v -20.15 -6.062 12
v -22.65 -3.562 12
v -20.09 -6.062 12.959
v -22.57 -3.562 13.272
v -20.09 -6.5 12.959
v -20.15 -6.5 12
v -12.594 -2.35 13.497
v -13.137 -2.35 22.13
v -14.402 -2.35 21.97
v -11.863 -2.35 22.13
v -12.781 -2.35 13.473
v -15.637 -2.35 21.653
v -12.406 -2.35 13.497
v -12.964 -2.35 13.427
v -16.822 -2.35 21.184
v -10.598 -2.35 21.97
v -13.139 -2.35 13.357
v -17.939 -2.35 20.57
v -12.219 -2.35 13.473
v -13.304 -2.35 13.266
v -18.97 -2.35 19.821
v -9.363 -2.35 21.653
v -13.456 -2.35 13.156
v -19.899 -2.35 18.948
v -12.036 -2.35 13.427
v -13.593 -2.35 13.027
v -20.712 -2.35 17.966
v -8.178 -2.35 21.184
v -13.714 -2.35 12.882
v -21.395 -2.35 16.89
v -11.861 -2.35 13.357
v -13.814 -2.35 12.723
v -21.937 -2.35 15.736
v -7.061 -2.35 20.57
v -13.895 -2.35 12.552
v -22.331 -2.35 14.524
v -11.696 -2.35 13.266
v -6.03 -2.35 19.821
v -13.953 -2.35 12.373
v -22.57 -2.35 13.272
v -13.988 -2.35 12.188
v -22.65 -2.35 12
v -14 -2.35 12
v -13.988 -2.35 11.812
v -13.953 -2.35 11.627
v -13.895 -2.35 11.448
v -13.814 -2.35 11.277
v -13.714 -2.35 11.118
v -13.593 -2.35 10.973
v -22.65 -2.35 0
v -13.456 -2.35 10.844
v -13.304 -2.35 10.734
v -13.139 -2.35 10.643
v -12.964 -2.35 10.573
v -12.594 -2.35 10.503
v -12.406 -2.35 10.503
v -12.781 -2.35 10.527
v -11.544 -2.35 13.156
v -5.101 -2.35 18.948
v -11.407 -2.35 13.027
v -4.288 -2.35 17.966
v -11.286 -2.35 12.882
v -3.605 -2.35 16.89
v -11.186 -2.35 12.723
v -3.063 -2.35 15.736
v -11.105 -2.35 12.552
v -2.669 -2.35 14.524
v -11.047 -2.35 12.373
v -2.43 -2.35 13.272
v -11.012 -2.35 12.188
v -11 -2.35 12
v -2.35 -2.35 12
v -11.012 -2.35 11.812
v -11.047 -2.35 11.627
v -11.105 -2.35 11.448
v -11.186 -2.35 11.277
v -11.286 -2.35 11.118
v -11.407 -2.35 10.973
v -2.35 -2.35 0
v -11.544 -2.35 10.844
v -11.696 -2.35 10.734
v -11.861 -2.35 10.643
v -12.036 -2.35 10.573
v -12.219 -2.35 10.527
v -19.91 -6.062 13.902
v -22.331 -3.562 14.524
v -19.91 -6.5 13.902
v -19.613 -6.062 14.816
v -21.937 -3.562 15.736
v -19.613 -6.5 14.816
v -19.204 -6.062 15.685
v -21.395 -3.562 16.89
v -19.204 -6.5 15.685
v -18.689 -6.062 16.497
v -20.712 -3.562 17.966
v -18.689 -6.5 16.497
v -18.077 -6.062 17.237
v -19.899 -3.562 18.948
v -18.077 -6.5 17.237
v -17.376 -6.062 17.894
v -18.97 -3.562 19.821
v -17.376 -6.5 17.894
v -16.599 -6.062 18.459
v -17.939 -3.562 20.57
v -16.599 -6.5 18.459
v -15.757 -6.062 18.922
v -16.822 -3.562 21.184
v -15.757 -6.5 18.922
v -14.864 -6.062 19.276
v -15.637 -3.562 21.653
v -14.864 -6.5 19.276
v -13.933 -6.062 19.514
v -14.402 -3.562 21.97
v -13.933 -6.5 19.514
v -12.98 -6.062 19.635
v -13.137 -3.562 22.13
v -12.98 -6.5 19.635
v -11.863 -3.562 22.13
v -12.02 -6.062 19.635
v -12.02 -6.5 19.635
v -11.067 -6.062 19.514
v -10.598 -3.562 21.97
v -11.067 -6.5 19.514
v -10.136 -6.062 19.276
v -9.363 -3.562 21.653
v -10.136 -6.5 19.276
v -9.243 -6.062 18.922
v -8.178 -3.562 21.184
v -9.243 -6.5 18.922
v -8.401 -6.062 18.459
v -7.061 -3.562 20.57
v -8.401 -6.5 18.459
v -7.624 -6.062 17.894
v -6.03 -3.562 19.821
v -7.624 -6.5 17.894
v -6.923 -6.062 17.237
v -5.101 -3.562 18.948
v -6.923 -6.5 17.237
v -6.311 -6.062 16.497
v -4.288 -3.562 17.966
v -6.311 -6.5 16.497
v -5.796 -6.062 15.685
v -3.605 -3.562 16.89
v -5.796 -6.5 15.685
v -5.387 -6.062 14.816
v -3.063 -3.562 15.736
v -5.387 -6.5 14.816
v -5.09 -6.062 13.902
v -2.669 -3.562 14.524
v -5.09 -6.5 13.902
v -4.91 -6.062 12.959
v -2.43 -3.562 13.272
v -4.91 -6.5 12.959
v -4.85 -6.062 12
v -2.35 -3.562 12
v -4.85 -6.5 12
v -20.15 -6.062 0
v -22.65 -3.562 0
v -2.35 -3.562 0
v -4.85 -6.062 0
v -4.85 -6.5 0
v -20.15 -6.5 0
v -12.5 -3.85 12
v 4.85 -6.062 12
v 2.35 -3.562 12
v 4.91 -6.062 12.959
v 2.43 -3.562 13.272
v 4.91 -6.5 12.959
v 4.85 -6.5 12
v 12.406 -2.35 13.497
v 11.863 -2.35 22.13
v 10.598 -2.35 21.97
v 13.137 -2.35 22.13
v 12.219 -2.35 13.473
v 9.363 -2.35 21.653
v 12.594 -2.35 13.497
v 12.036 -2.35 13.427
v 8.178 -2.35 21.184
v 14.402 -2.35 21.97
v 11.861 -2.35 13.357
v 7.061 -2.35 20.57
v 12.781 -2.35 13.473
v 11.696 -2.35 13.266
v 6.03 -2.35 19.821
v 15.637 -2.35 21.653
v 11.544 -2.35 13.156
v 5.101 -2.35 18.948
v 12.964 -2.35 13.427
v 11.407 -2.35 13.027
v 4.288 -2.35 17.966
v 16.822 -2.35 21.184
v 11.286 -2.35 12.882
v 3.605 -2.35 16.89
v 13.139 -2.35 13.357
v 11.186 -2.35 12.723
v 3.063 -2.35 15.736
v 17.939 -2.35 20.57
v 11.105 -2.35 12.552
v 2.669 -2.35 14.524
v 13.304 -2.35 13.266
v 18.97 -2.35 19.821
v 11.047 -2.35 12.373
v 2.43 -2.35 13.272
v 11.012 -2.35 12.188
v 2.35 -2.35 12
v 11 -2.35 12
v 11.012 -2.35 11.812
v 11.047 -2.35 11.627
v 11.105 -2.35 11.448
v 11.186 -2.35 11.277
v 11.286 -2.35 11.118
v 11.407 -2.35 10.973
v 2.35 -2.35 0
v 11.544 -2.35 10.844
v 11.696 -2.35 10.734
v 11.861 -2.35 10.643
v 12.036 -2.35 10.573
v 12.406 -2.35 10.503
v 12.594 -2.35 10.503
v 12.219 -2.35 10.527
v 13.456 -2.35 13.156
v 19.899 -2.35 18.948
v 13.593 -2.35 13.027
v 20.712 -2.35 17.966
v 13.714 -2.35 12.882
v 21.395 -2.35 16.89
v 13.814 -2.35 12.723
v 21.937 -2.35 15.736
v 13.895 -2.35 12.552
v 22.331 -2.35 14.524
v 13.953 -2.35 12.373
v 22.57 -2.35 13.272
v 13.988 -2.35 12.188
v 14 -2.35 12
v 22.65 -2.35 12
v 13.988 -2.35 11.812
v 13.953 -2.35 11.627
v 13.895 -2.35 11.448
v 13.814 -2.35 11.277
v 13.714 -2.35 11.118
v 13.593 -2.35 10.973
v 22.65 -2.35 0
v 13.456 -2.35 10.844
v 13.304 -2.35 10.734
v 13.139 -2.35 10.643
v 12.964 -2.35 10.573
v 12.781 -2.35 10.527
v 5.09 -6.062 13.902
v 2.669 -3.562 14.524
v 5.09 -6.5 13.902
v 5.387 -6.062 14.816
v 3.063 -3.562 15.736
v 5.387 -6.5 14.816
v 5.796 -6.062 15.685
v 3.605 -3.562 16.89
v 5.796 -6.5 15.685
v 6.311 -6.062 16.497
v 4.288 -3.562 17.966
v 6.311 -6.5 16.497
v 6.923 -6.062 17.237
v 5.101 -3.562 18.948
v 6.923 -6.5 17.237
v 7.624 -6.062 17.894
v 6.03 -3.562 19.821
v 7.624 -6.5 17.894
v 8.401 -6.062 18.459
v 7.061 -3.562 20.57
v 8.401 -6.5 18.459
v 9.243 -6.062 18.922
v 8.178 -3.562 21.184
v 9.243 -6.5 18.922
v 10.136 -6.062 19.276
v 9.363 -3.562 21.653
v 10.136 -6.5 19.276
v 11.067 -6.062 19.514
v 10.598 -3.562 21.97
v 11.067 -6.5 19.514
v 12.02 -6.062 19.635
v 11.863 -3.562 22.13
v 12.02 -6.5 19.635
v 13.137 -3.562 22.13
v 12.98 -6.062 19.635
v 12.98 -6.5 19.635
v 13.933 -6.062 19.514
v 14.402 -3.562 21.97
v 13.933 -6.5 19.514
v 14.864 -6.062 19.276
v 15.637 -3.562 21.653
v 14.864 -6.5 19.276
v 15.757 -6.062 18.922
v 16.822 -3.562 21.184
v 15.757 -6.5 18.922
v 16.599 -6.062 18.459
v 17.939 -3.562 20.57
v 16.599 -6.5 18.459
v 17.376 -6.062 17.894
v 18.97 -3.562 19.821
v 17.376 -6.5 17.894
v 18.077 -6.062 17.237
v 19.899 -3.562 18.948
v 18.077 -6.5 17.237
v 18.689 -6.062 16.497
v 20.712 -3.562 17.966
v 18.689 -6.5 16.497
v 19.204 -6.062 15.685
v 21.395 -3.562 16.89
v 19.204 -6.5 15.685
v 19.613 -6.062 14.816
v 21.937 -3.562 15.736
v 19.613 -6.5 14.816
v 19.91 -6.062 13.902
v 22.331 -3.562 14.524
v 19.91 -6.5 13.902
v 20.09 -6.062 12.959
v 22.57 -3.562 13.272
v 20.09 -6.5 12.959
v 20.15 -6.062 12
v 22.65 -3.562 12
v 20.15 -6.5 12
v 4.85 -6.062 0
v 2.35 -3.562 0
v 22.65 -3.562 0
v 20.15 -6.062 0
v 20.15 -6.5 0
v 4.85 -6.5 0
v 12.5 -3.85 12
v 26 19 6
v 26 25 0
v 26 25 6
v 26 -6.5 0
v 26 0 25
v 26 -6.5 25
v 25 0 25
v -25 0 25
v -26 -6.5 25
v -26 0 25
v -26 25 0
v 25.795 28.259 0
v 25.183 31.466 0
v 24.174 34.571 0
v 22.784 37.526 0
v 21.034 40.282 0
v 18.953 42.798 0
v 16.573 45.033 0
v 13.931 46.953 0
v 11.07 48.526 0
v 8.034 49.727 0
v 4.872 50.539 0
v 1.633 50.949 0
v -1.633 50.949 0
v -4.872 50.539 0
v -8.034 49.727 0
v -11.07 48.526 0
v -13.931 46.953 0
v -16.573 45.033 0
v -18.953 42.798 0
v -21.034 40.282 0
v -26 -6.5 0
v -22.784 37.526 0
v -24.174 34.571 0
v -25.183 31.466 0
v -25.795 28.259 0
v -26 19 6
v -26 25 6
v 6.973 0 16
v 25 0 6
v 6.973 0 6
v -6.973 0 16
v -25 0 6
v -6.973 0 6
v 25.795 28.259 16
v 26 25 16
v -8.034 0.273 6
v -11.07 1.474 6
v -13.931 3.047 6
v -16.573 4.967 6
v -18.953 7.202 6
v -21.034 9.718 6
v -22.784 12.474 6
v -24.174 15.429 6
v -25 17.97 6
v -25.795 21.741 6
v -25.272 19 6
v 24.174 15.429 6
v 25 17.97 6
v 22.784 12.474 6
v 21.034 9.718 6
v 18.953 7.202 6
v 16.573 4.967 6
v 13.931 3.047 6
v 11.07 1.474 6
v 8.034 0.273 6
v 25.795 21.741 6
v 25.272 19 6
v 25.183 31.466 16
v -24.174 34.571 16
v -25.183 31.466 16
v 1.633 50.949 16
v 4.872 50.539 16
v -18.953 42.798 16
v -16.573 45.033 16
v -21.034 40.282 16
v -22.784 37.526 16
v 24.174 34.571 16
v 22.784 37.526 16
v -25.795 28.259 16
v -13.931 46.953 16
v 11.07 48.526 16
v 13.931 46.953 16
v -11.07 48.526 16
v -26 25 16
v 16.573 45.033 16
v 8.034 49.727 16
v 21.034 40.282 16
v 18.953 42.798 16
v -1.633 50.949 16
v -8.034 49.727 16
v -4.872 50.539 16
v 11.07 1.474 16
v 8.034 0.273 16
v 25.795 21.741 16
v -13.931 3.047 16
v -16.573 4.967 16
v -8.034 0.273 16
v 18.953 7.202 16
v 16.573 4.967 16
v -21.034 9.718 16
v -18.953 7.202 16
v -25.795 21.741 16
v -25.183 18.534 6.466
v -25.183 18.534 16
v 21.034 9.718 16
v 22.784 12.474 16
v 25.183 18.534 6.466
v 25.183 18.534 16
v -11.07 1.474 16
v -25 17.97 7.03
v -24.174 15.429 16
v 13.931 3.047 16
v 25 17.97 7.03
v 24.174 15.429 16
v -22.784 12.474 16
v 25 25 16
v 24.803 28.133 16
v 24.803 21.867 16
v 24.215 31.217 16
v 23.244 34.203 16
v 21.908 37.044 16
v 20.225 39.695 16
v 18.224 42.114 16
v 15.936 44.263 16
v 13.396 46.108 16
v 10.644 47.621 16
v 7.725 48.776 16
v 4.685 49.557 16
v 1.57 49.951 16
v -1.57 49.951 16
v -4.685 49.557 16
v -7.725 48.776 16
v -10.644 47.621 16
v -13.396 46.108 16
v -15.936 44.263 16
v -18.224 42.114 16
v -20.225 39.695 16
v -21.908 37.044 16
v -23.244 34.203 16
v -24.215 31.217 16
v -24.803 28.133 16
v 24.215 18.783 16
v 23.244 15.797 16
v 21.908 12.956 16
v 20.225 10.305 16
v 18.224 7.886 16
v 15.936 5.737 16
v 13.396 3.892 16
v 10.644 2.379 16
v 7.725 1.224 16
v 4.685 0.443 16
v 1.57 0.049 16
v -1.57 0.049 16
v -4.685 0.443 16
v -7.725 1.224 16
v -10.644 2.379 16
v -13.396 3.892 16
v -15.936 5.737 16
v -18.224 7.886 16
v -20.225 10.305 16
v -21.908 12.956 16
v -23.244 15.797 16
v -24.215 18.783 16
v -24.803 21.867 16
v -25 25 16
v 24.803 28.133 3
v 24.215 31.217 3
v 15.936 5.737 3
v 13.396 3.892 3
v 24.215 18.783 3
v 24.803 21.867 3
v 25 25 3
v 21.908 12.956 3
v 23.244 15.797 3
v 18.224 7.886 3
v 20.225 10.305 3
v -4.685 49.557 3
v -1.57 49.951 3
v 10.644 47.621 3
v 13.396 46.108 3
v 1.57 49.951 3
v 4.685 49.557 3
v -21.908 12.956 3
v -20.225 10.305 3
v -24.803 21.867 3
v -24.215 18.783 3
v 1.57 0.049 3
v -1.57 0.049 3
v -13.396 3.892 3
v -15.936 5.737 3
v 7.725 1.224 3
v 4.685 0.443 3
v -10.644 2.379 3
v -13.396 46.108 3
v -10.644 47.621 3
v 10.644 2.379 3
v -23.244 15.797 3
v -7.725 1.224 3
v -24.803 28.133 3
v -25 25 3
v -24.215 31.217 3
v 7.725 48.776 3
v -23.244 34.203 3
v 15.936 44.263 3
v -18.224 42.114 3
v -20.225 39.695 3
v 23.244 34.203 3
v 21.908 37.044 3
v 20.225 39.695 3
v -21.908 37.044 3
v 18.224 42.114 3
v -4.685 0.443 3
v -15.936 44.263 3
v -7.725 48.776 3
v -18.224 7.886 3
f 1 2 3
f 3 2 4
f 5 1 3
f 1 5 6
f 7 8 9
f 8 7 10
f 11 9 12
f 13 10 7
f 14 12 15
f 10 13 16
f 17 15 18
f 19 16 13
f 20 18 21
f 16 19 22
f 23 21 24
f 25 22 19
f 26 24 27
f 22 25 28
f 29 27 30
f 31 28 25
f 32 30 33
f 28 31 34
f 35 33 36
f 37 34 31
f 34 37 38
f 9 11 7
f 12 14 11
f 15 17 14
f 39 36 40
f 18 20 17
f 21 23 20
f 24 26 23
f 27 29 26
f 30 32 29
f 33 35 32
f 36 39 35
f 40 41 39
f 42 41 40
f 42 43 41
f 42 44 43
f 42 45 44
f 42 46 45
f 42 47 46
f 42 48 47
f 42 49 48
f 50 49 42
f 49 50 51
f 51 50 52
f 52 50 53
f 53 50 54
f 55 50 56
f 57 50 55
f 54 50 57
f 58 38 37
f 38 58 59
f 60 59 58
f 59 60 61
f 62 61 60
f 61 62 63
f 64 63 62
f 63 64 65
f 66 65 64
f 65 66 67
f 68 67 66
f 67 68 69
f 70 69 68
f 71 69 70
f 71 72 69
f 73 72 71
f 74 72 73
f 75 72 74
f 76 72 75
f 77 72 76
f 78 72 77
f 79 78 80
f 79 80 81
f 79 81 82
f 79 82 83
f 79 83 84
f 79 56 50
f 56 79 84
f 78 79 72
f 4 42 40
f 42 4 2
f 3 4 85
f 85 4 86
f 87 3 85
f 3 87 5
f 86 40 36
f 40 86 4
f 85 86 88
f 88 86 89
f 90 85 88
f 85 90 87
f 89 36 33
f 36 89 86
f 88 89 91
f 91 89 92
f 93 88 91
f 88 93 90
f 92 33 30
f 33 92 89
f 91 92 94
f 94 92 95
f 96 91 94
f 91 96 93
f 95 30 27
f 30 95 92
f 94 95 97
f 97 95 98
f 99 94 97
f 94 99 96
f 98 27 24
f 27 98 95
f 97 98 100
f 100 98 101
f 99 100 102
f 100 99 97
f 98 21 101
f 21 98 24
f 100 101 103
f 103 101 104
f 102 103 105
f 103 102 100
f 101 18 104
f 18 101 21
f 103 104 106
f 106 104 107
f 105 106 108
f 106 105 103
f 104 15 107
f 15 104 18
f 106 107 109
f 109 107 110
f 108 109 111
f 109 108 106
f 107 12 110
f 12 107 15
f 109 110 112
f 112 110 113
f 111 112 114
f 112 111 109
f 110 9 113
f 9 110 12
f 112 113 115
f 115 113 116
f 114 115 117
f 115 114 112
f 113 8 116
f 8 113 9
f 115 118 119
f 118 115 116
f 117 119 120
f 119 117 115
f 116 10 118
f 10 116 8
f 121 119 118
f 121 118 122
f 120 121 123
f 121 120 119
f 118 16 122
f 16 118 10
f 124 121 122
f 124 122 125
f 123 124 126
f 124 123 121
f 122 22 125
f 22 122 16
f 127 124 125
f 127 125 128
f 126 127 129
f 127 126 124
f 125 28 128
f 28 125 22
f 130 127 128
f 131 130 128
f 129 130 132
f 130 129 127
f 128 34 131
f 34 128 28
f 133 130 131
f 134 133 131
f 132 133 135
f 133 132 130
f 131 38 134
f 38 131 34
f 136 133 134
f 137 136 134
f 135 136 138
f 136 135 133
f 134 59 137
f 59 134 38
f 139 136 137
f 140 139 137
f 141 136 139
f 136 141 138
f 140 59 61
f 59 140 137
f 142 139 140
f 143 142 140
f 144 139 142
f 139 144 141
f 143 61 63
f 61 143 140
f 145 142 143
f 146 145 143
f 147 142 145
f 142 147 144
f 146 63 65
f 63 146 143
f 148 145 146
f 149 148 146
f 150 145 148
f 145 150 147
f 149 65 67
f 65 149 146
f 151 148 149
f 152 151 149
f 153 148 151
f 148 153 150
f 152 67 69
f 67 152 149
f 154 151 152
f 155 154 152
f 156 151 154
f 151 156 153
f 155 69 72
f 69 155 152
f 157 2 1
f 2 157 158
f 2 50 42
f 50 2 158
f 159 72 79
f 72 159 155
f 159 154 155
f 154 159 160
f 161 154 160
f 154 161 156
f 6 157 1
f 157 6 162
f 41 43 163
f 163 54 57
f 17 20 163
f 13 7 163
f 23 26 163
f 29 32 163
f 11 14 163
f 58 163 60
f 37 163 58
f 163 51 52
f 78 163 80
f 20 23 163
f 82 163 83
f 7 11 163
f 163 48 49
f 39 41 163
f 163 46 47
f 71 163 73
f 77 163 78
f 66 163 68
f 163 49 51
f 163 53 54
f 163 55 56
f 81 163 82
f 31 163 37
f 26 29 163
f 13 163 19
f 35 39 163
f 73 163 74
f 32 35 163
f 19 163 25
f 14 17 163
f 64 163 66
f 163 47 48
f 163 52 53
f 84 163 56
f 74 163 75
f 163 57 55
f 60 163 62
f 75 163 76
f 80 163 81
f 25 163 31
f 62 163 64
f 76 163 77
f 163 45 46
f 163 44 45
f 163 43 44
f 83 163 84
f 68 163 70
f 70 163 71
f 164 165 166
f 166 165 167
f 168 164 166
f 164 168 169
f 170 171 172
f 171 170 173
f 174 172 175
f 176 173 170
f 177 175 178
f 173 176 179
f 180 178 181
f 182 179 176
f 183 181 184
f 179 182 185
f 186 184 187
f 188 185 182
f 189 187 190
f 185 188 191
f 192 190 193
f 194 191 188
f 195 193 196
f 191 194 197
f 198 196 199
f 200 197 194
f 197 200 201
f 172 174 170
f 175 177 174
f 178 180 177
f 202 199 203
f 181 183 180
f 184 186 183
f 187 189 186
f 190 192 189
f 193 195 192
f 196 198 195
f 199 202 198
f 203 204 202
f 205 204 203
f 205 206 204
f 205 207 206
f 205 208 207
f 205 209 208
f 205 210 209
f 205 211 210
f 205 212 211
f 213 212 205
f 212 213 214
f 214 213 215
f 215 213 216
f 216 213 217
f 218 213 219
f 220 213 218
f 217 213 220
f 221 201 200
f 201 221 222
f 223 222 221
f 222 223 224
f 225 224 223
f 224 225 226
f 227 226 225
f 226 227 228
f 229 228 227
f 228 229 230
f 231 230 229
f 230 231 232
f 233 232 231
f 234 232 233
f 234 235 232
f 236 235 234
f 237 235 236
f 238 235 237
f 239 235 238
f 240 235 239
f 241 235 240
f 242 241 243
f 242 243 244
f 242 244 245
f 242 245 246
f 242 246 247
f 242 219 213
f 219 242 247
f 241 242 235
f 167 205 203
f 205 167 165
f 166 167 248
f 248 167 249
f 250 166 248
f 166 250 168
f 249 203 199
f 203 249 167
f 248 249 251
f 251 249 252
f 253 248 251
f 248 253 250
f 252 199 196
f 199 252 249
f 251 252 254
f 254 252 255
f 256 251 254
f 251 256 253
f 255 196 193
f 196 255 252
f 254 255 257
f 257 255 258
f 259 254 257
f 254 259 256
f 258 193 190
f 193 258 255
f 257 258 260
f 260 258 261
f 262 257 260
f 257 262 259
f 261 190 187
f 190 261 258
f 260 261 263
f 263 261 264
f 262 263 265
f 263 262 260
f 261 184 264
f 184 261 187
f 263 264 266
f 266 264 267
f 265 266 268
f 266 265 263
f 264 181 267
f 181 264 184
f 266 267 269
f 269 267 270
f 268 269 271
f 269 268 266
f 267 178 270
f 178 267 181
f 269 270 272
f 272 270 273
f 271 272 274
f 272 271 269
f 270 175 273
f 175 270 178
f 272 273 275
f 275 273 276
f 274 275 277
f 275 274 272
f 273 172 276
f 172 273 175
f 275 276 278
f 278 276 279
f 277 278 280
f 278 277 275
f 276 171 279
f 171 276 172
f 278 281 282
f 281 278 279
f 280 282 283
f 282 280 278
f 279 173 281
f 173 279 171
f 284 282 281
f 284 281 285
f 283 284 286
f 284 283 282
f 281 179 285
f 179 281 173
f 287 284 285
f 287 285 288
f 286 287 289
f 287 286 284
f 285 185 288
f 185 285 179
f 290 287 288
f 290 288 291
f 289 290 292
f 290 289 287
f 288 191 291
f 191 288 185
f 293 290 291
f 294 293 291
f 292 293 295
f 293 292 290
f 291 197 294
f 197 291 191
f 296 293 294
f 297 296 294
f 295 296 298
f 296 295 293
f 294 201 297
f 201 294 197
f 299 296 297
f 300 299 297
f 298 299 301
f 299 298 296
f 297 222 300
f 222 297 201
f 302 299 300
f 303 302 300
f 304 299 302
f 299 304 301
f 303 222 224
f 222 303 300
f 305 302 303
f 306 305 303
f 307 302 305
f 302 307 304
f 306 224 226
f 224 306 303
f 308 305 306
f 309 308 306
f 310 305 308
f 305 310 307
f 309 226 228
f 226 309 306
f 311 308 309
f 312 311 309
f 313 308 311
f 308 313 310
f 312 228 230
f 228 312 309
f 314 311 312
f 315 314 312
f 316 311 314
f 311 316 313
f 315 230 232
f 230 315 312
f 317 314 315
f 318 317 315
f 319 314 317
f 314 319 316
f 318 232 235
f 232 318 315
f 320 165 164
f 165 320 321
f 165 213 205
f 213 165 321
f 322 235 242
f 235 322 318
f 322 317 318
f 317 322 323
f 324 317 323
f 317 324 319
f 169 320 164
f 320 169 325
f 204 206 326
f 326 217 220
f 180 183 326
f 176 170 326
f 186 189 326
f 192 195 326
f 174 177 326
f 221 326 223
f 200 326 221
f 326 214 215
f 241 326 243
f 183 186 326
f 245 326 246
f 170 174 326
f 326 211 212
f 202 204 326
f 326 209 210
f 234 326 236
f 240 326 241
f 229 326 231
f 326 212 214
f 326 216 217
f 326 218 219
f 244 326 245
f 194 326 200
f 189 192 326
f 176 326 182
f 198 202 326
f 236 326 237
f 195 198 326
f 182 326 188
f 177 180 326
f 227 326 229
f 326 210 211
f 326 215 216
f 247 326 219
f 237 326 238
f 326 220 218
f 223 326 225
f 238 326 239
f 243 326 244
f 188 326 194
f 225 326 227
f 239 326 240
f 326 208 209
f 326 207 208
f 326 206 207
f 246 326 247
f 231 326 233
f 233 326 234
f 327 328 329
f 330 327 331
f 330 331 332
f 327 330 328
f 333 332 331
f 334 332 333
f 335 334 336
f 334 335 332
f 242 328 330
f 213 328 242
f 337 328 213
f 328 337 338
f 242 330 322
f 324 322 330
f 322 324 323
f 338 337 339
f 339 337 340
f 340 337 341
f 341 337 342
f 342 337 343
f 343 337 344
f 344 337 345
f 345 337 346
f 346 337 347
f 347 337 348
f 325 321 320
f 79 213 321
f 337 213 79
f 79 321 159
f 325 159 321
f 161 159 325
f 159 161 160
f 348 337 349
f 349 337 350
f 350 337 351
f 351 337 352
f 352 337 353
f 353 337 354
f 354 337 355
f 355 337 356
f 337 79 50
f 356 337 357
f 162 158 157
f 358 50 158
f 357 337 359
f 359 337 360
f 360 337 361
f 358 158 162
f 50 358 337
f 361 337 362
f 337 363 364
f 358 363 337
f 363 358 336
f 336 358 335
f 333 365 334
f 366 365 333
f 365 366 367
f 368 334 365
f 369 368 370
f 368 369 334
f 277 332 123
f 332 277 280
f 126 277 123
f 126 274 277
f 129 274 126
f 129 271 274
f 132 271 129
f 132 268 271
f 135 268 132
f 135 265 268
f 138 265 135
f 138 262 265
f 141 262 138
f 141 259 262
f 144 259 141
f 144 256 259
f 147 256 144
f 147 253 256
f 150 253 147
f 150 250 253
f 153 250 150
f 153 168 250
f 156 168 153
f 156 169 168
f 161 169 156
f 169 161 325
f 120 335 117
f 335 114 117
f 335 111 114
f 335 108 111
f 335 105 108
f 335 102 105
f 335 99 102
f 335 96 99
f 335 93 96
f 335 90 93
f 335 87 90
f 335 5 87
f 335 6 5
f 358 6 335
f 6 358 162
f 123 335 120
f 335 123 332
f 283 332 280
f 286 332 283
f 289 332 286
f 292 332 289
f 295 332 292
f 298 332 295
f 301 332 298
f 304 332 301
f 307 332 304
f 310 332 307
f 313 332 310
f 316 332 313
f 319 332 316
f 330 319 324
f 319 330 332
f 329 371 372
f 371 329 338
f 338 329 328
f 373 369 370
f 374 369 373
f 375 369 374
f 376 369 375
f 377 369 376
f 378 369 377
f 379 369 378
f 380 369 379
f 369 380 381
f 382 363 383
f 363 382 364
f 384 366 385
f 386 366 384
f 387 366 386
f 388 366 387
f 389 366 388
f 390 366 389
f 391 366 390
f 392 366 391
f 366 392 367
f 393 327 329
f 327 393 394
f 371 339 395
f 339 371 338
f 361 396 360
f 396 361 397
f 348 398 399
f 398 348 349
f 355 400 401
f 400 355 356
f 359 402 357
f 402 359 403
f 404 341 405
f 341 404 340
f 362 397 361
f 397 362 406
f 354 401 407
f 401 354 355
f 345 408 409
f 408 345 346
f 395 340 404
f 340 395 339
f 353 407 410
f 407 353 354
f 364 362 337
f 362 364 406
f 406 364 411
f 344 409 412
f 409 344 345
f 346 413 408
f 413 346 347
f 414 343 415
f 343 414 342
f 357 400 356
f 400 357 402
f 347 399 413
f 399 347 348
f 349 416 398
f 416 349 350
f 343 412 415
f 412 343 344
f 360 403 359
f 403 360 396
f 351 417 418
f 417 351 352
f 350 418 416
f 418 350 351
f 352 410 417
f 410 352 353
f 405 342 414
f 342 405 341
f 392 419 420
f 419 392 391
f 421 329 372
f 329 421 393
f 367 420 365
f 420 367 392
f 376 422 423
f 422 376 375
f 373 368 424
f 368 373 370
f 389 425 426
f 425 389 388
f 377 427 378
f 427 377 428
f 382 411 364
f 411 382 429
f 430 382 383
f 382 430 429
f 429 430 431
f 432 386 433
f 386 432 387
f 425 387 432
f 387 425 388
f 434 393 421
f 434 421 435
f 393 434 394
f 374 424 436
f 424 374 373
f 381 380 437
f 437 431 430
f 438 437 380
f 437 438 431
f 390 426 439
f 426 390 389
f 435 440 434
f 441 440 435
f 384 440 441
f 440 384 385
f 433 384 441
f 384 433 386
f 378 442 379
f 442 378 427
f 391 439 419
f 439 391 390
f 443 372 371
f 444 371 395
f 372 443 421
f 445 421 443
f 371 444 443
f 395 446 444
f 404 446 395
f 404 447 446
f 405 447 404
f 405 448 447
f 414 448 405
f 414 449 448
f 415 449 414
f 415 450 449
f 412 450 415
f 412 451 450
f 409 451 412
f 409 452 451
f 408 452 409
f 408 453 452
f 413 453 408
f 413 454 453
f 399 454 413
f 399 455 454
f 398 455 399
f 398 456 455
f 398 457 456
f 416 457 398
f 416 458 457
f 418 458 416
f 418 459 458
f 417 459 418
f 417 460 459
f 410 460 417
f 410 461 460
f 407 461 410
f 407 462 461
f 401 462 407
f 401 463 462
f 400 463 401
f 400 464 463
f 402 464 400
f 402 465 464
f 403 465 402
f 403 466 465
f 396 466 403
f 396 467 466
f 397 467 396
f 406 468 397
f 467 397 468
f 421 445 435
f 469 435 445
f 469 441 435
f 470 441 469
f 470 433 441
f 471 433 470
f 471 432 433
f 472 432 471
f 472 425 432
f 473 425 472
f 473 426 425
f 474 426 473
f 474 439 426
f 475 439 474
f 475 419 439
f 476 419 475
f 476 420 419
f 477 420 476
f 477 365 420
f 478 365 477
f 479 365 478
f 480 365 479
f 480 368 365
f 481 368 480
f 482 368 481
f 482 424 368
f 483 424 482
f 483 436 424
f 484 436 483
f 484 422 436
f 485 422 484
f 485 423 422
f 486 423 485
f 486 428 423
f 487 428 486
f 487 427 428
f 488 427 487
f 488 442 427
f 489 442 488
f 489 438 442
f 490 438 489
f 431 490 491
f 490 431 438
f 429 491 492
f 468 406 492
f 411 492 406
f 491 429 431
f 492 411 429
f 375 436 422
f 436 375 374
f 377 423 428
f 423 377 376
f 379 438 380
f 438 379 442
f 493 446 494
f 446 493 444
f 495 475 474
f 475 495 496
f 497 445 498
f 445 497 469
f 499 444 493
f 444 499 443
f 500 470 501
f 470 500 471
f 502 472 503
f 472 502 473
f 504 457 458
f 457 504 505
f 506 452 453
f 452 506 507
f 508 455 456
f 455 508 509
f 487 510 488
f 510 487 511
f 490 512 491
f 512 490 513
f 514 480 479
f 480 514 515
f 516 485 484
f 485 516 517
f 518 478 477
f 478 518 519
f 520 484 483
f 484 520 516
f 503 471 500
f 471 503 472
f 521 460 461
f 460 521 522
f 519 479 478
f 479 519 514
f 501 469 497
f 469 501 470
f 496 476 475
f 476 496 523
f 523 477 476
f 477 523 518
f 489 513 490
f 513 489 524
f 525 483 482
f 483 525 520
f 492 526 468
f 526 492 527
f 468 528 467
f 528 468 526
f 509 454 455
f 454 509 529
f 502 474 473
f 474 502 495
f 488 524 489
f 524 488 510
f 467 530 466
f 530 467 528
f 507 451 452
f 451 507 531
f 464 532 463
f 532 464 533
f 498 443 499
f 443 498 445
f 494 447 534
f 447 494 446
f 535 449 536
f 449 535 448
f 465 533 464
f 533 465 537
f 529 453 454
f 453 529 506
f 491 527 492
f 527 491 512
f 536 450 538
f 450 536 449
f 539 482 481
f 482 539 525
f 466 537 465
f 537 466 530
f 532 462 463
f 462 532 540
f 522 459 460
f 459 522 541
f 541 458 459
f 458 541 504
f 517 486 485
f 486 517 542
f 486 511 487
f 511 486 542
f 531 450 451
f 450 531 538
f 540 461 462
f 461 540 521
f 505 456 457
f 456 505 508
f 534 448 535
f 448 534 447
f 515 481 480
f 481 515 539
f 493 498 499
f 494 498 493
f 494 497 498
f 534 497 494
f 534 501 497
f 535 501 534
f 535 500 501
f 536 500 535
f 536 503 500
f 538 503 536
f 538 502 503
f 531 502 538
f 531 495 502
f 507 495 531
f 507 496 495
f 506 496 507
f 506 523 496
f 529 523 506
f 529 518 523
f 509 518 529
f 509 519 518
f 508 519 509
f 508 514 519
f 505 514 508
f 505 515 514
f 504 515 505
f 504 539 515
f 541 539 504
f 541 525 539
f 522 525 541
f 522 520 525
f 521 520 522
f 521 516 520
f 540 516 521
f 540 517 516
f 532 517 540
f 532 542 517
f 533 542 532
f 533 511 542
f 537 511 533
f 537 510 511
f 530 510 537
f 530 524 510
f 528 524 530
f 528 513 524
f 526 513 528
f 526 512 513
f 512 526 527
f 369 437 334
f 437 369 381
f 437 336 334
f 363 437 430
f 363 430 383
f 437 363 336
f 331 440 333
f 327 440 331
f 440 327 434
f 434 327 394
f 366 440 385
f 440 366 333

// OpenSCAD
/*Created by Andy Levesque
Credit to @David D on Printables and Jonathan at Keep Making for Multiconnect and Multiboard, respectively
Licensed Creative Commons 4.0 Attribution Non-Commercial Sharable with Attribution
*/

/*[Parameters]*/
//diameter (in mm) of the item you wish to insert (this becomes the internal diameter)
itemDiameter = 50; //0.1
//thickness (in mm) of the wall surrounding the item
rimThickness = 1;
//Thickness (in mm) of the base underneath the item you are holding
baseThickness = 3;
//Additional thickness of the area between the item holding and the backer.
shelfSupportHeight = 3;
//Additional height (in mm) of the rim protruding upward to hold the item
rimHeight = 10;
//Additional Backer Height (in mm) in case you prefer additional support for something heavy
additionalBackerHeight = 0;

/*[Slot Customization]*/
//Distance between Multiconnect slots on the back (25mm is standard for MultiBoard)
distanceBetweenSlots = 25;
//QuickRelease removes the small indent in the top of the slots that lock the part into place
slotQuickRelease = false;
//Dimple scale tweaks the size of the dimple in the slot for printers that need a larger dimple to print correctly
dimpleScale = 1; //[0.5:.05:1.5]
//Scale the size of slots in the back (1.015 scale is default for a tight fit. Increase if your finding poor fit. )
slotTolerance = 1.00; //[0.925:0.005:1.075]
//Move the slot in (positive) or out (negative)
slotDepthMicroadjustment = 0; //[-.5:0.05:.5]
//enable a slot on-ramp for easy mounting of tall items
onRampEnabled = true;
//frequency of slots for on-ramp. 1 = every slot; 2 = every 2 slots; etc.
onRampEveryXSlots = 1;


/*[Hidden]*/
totalWidth = itemDiameter + rimThickness*2;
totalHeight = max(baseThickness+shelfSupportHeight+0.25*itemDiameter,25);

//start build
translate(v = [-max(totalWidth,distanceBetweenSlots)/2,0,0]) 
    multiconnectBack(backWidth = totalWidth, backHeight = totalHeight+additionalBackerHeight, distanceBetweenSlots = distanceBetweenSlots);
    //item holder
translate(v = [-totalWidth/2,0,0]) 
union() {
    difference() {
        //itemwalls
        union() {
            hull(){
                translate(v = [totalWidth/2,itemDiameter/2,0]) 
                    //outer circle
                    linear_extrude(height = shelfSupportHeight+baseThickness) 
                            circle(r = itemDiameter/2+rimThickness, $fn=50);
                    //wide back for hull operation
                    linear_extrude(height = shelfSupportHeight+baseThickness) 
                            square(size = [totalWidth,1]);
                }
            //thin holding wall
            translate(v = [totalWidth/2,itemDiameter/2,shelfSupportHeight+baseThickness]) 
                linear_extrude(height = rimHeight) 
                    circle(r = itemDiameter/2+rimThickness, $fn=50);
        }
        //itemDiameter (i.e., delete tool)
        translate(v = [totalWidth/2,itemDiameter/2,baseThickness]) linear_extrude(height = shelfSupportHeight+rimHeight+1) circle(r = itemDiameter/2, $fn=50);
    }
    //brackets
    bracketSize = min(totalHeight-baseThickness-shelfSupportHeight, itemDiameter/2);
    translate(v = [rimThickness,0,bracketSize+baseThickness+shelfSupportHeight]) shelfBracket(bracketHeight = bracketSize, bracketDepth = bracketSize, rimThickness = rimThickness);
    translate(v = [rimThickness*2+itemDiameter,0,bracketSize+baseThickness+shelfSupportHeight]) shelfBracket(bracketHeight = bracketSize, bracketDepth = bracketSize, rimThickness = rimThickness);
}

//BEGIN MODULES
//Slotted back Module
module multiconnectBack(backWidth, backHeight, distanceBetweenSlots)
{
    //slot count calculates how many slots can fit on the back. Based on internal width for buffer. 
    //slot width needs to be at least the distance between slot for at least 1 slot to generate
    let (backWidth = max(backWidth,distanceBetweenSlots), backHeight = max(backHeight, 25),slotCount = floor(backWidth/distanceBetweenSlots), backThickness = 6.5){
        difference() {
            translate(v = [0,-backThickness,0]) cube(size = [backWidth,backThickness,backHeight]);
            //Loop through slots and center on the item
            //Note: I kept doing math until it looked right. It's possible this can be simplified.
            for (slotNum = [0:1:slotCount-1]) {
                translate(v = [distanceBetweenSlots/2+(backWidth/distanceBetweenSlots-slotCount)*distanceBetweenSlots/2+slotNum*distanceBetweenSlots,-2.35+slotDepthMicroadjustment,backHeight-13]) {
                    slotTool(backHeight);
                }
            }
        }
    }
    //Create Slot Tool
    module slotTool(totalHeight) {
        scale(v = slotTolerance)
        //slot minus optional dimple with optional on-ramp
        let (slotProfile = [[0,0],[10.15,0],[10.15,1.2121],[7.65,3.712],[7.65,5],[0,5]])
        difference() {
            union() {
                //round top
                rotate(a = [90,0,0,]) 
                    rotate_extrude($fn=50) 
                        polygon(points = slotProfile);
                //long slot
                translate(v = [0,0,0]) 
                    rotate(a = [180,0,0]) 
                    linear_extrude(height = totalHeight+1) 
                        union(){
                            polygon(points = slotProfile);
                            mirror([1,0,0])
                                polygon(points = slotProfile);
                        }
                //on-ramp
                if(onRampEnabled)
                    for(y = [1:onRampEveryXSlots:totalHeight/distanceBetweenSlots])
                        translate(v = [0,-5,-y*distanceBetweenSlots]) 
                            rotate(a = [-90,0,0]) 
                                cylinder(h = 5, r1 = 12, r2 = 10.15);
            }
            //dimple
            if (slotQuickRelease == false)
                scale(v = dimpleScale) 
                rotate(a = [90,0,0,]) 
                    rotate_extrude($fn=50) 
                        polygon(points = [[0,0],[0,1.5],[1.5,0]]);
        }
    }
}

module shelfBracket(bracketHeight, bracketDepth, rimThickness){
        rotate(a = [-90,0,90]) 
            linear_extrude(height = rimThickness) 
                polygon([[0,0],[0,bracketHeight],[bracketDepth,bracketHeight]]);
}
